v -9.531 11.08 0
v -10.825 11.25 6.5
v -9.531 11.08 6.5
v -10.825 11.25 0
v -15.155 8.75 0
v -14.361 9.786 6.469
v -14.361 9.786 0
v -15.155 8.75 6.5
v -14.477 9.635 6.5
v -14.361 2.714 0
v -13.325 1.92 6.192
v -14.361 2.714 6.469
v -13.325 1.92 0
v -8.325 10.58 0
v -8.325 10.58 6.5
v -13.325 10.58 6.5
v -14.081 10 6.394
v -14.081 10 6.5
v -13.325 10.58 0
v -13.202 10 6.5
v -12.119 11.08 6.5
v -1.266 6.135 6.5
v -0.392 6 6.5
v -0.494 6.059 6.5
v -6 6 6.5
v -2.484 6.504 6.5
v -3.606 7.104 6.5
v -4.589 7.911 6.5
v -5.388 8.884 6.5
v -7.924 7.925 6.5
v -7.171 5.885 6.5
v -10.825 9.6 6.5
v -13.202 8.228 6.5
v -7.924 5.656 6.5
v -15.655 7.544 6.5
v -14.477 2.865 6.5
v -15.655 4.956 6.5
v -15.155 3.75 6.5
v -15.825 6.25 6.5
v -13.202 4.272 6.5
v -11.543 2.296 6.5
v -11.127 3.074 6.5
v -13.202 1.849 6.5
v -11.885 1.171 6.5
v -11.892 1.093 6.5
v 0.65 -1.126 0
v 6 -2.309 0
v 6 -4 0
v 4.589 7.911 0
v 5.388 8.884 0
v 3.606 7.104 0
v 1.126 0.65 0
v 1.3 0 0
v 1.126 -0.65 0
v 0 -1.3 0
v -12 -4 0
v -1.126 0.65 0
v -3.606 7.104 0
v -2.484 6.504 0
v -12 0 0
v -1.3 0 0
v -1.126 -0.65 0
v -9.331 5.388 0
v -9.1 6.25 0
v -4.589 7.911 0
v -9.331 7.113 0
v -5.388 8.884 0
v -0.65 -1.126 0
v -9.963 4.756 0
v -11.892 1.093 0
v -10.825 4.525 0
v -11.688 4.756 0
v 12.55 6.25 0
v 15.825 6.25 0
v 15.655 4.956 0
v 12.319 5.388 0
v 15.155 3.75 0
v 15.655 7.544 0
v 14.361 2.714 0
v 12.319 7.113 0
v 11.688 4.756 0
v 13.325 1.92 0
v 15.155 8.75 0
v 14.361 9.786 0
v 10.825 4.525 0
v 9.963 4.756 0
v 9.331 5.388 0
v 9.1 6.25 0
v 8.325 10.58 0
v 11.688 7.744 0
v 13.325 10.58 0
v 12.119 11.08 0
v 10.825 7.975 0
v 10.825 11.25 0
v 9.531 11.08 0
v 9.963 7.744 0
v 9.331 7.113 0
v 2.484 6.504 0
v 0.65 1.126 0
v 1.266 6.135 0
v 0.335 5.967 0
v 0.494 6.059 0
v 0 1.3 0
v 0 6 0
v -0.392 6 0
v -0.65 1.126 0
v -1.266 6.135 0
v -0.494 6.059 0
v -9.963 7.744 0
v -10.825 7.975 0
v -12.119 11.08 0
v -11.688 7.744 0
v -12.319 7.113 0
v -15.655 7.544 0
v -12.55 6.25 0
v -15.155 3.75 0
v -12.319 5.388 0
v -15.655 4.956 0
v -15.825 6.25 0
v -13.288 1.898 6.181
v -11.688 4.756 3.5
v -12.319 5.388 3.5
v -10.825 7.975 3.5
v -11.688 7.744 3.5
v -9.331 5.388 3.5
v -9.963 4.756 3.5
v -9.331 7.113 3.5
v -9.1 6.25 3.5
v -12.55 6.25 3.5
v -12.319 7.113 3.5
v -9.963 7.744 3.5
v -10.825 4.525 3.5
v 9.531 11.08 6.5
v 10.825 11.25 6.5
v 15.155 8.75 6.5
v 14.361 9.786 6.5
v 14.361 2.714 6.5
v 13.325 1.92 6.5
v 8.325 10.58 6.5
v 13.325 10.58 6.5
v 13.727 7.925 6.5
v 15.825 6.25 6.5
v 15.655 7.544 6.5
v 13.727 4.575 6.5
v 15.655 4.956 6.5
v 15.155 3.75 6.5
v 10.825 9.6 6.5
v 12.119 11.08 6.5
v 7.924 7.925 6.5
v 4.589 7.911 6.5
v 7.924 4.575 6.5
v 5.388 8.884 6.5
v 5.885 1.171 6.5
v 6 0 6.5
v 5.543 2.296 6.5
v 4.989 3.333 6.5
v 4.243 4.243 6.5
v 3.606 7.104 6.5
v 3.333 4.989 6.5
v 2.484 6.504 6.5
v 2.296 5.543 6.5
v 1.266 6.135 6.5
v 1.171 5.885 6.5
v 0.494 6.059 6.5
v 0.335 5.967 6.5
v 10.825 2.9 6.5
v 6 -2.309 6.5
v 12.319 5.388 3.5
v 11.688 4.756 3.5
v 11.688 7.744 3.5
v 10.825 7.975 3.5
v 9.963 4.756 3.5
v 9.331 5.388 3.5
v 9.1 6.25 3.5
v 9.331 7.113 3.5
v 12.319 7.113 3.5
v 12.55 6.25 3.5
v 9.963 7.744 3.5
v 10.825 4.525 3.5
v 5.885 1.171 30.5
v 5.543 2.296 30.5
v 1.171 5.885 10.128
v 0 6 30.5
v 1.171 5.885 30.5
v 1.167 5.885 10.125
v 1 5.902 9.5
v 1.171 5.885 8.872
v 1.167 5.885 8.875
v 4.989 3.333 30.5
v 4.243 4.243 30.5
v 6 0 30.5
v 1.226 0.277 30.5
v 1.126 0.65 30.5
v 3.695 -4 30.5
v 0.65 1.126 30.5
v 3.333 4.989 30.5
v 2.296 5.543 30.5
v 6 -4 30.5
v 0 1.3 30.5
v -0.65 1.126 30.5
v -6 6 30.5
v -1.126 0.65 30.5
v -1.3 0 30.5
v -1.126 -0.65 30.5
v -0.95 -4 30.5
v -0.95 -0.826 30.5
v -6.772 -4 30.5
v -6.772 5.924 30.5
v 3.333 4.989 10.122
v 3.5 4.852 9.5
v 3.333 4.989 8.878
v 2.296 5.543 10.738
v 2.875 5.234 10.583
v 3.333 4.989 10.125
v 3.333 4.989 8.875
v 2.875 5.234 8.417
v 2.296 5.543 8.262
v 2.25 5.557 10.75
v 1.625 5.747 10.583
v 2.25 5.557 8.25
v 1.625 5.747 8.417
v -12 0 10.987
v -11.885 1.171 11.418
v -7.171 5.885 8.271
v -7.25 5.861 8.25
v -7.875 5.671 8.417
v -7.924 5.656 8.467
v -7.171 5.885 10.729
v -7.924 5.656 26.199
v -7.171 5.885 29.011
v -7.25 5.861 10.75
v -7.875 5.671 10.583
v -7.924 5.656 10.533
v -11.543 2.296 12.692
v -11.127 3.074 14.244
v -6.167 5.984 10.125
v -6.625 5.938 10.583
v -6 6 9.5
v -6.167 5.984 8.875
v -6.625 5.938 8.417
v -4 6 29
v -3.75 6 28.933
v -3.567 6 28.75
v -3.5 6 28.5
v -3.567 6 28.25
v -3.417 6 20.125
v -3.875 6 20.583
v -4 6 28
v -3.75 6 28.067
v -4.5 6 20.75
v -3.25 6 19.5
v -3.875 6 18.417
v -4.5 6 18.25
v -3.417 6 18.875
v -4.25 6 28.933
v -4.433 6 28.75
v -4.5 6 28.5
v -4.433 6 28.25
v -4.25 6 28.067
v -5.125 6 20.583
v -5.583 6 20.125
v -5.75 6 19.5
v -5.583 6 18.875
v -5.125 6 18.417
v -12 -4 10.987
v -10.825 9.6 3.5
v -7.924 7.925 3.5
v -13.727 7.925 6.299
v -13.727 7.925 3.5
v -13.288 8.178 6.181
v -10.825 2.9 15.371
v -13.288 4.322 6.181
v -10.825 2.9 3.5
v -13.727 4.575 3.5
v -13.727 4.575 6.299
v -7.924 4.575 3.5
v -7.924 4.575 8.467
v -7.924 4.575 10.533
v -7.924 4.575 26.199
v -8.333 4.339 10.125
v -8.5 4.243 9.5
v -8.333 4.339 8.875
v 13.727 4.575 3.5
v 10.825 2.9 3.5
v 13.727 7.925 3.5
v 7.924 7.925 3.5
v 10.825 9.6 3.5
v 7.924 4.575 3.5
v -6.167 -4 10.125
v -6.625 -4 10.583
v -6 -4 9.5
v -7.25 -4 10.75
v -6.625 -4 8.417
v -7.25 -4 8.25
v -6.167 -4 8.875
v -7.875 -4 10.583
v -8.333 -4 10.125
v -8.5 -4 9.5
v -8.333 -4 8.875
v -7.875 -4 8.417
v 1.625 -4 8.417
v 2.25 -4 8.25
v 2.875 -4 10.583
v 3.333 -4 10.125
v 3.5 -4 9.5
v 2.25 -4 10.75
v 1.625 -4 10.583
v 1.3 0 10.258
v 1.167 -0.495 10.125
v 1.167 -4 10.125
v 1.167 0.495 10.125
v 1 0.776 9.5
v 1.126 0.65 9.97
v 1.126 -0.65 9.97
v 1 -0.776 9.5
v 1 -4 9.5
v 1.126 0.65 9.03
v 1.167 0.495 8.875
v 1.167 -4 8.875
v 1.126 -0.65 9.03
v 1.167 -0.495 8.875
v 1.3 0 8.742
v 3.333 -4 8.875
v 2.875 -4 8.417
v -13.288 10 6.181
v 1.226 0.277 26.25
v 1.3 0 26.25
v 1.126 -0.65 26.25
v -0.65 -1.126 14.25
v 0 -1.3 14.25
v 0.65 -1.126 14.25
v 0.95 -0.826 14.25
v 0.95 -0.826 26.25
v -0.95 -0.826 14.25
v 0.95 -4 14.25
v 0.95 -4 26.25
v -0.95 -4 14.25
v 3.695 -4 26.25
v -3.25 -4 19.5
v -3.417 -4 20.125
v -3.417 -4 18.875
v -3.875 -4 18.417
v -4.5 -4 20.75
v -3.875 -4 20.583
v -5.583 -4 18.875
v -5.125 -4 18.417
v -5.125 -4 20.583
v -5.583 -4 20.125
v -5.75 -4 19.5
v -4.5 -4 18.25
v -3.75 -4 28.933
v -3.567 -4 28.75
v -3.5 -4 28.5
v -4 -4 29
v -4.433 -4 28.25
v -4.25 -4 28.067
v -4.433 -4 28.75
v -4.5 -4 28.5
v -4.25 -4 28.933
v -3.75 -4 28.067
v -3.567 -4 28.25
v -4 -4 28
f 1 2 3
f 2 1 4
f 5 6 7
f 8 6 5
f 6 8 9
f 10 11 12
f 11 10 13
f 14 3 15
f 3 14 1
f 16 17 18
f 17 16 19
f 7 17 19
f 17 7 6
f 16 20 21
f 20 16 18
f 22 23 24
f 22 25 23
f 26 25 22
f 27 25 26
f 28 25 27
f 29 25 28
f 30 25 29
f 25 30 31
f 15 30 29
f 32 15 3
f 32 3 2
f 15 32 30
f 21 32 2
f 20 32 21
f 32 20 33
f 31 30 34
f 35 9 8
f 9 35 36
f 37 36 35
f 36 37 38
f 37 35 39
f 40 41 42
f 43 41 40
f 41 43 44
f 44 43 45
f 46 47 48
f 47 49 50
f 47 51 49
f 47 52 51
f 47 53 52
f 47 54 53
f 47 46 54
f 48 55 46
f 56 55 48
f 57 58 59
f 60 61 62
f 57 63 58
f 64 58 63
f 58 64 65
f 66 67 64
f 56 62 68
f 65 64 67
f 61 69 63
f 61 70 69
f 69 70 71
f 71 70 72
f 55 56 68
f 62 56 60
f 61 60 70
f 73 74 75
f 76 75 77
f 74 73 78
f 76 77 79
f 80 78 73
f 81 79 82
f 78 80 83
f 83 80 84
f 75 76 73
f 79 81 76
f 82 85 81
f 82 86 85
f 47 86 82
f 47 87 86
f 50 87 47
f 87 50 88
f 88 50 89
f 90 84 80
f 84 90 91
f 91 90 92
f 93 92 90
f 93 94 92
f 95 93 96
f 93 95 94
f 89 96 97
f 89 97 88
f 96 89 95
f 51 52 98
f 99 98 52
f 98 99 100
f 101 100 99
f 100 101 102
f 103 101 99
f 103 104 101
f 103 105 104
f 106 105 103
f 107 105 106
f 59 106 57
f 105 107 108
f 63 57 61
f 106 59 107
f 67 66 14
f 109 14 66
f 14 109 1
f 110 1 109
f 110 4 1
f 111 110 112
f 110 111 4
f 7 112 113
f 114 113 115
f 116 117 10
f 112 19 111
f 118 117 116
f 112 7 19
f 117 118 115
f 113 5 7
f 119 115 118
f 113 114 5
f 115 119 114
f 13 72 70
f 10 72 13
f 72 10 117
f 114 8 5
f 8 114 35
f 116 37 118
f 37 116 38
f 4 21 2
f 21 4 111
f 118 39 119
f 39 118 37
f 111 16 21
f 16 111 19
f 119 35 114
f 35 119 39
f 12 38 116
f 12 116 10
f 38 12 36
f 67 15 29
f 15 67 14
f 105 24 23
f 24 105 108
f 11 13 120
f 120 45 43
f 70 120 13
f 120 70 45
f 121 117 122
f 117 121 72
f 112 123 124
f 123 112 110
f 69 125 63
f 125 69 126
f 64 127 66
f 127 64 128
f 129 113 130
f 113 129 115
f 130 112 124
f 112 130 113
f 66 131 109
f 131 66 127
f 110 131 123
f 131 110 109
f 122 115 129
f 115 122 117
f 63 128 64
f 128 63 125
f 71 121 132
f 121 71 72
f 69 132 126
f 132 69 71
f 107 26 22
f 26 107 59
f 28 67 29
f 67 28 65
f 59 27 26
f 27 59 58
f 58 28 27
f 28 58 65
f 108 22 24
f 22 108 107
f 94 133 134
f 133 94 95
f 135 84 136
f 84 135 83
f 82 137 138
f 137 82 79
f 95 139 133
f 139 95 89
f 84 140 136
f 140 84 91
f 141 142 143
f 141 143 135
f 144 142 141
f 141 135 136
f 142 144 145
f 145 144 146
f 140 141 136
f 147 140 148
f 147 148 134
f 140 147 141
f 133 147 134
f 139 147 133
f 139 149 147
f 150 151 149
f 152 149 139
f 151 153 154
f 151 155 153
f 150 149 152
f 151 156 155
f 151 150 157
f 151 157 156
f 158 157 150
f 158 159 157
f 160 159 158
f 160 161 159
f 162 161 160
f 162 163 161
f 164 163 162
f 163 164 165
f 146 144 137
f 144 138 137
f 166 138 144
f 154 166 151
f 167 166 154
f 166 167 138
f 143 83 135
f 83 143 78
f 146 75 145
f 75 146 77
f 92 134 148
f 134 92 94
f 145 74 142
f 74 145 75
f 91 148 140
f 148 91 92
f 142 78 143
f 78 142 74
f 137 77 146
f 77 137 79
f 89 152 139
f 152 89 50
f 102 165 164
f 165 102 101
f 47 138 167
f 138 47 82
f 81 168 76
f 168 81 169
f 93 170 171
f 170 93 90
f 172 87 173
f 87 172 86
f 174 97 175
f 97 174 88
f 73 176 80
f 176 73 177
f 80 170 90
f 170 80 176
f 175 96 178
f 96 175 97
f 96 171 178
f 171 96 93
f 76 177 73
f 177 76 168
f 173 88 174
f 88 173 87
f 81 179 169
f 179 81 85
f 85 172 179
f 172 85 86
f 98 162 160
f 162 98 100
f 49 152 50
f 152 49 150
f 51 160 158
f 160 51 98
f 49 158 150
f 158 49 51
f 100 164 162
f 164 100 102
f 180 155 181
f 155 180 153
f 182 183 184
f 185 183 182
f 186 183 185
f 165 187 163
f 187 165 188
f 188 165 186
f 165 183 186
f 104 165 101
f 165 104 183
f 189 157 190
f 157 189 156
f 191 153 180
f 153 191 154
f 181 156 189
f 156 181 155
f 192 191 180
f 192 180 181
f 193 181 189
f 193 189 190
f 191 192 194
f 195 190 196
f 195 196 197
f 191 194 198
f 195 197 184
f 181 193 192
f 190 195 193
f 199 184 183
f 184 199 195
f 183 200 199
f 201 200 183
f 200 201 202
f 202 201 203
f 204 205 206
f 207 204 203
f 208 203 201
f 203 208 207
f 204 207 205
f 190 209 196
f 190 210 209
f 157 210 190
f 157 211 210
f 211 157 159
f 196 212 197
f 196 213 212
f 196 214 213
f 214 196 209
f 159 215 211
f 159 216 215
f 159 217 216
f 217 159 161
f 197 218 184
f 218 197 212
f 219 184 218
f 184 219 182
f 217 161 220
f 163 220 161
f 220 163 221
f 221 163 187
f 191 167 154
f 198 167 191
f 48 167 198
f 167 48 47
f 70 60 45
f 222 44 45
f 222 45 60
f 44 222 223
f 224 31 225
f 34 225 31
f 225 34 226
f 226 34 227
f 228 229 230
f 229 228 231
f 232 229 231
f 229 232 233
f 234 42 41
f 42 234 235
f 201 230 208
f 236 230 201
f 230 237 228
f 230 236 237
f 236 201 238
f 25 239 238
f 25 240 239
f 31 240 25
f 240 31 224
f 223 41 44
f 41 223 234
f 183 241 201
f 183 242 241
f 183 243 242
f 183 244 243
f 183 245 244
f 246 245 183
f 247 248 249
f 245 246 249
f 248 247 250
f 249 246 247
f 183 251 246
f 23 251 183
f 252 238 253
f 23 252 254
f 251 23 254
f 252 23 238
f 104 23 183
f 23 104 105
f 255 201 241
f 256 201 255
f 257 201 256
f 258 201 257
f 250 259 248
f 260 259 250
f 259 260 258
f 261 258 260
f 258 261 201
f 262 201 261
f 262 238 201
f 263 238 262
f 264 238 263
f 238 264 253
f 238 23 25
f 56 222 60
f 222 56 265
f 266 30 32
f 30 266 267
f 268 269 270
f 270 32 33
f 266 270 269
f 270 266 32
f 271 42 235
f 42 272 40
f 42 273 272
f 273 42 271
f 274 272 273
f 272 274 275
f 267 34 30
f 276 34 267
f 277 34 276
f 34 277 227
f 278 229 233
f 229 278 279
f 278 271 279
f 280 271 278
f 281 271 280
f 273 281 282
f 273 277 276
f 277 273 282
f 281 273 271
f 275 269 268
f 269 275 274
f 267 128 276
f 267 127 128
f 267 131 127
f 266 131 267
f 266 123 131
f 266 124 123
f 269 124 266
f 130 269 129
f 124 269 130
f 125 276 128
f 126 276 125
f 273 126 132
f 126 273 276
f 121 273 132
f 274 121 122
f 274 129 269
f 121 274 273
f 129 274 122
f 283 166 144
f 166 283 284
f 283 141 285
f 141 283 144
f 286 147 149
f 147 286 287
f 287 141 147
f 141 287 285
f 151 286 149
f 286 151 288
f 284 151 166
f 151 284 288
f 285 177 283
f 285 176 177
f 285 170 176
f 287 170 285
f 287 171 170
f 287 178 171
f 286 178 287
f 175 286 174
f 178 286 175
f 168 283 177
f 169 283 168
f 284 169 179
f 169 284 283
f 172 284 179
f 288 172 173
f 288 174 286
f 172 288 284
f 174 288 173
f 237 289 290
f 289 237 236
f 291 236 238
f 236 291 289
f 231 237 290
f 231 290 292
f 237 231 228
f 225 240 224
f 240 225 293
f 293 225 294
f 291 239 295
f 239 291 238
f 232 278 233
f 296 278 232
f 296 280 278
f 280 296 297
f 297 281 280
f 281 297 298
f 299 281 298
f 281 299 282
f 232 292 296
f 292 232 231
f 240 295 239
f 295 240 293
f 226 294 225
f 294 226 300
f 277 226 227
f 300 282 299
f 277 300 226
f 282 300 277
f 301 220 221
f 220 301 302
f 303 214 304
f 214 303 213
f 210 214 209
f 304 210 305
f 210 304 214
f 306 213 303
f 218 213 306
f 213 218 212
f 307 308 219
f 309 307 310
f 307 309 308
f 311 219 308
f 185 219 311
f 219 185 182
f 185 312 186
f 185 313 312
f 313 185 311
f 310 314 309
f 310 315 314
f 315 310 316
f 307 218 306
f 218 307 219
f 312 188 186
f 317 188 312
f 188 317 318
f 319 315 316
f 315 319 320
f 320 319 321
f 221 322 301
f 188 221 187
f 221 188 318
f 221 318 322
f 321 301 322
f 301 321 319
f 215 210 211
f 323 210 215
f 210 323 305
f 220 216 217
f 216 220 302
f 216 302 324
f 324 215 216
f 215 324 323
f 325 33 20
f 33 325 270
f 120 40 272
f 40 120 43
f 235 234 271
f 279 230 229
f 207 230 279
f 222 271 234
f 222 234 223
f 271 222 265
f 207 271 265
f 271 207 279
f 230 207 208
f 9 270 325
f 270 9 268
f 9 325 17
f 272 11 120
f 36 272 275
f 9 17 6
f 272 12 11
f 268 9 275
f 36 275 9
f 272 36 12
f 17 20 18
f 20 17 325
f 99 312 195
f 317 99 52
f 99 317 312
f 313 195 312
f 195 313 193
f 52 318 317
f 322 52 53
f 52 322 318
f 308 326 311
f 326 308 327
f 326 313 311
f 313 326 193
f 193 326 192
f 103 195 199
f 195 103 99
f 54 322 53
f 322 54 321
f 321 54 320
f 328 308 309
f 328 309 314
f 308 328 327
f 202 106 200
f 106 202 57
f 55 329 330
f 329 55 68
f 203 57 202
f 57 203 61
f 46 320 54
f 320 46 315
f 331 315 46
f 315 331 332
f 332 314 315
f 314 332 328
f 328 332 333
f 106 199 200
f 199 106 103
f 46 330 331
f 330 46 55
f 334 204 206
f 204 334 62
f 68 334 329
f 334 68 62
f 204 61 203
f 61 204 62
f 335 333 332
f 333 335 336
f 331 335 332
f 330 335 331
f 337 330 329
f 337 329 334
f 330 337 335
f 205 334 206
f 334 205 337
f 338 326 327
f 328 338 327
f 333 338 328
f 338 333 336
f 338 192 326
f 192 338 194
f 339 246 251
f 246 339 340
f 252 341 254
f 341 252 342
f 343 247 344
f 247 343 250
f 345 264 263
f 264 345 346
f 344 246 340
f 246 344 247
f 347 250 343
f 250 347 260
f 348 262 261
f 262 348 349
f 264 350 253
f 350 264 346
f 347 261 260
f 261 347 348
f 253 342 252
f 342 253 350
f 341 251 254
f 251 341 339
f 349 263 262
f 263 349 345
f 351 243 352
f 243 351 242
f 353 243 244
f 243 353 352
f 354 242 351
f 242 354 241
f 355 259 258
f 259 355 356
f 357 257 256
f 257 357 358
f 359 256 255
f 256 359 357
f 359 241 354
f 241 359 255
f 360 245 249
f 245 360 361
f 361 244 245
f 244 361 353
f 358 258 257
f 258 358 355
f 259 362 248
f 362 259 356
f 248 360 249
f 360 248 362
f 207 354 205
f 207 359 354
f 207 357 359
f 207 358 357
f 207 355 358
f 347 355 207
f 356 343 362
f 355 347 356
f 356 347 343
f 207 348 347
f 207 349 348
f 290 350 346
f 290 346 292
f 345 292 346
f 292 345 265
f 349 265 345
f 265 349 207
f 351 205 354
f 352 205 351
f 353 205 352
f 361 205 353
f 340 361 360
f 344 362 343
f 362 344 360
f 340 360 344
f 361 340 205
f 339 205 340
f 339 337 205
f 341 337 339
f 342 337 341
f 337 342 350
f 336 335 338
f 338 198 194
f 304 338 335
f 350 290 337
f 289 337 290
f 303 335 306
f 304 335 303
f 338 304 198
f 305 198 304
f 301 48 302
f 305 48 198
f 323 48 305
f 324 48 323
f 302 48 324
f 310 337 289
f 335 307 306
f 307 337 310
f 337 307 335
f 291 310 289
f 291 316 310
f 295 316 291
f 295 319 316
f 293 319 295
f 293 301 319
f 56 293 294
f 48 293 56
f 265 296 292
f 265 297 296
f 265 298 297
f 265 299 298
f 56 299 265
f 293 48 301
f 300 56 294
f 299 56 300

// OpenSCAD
// file: microswitch.scad
// Don't print this file, purchase real micro switches
// e.g. Honeywell ZM10B10A01 or OMRON SS-5 or similar.

module microswitch() {
  difference() {
    union() {
      translate([0, 0, 2.5])
        cube([19.8, 6, 10], center=true);
      translate([3, 0.5, 6])
        cube([2, 3.5, 5], center=true);
      for (x = [-8, -1, 8]) {
        translate([x, 0, 0])
          cube([0.6, 3.2, 13], center=true);
      }
    }
    for (x = [-9.5/2, 9.5/2]) {
      translate([x, 0, 0]) rotate([90, 0, 0])
        cylinder(r=2.5/2, h=20, center=true, $fn=12);
    }
  }
}

microswitch();
// file: configuration.scad
// Increase this if your slicer or printer make holes too tight.
extra_radius = 0.1;

// OD = outside diameter, corner to corner.
m3_nut_od = 6.1;
m3_nut_radius = m3_nut_od/2 + 0.2 + extra_radius;
m3_washer_radius = 3.5 + extra_radius;

// Major diameter of metric 3mm thread.
m3_major = 2.85;
m3_radius = m3_major/2 + extra_radius;
m3_wide_radius = m3_major/2 + extra_radius + 0.2;

// NEMA17 stepper motors.
motor_shaft_diameter = 5;
motor_shaft_radius = motor_shaft_diameter/2 + extra_radius;

// Frame brackets. M3x8mm screws work best with 3.6 mm brackets.
thickness = 3.6;

// OpenBeam or Misumi. Currently only 15x15 mm, but there is a plan
// to make models more parametric and allow 20x20 mm in the future.
extrusion = 15;

// Placement for the NEMA17 stepper motors.
motor_offset = 44;
motor_length = 47;

probe_tunnel_radius = 1.25 + extra_radius;
probe_excentricity = 5;
// main file
include <configuration.scad>;

use <microswitch.scad>;

height = 30.5;

height2 = 30.5;

// distance between bottom of switch and z=0
height3 = 7;

// change if you are not using a 1.5mm allen
tunnel = 2.4;

face_offset = 4;

foot_height = 6.5;

module foot() {
  difference() {
    translate([12.5, 0, 0]) rotate([0, 0, -60])
      translate([-12.5, 0, foot_height/2.]) rotate([0, 0, -60]) union() {
        cylinder(r=5, h=foot_height, center=true, $fn=24);
        translate([10, 0, 0])
            cube([20, 10, foot_height], center=true);
    }
    translate([0, -10, 0])
      cube([40, 20, 20], center=true);
    translate([12.5, 0, 0]) {
      // Space for bowden push fit connector.
      cylinder(r=6.49, h=3*height, center=true, $fn=32);
      for (a = [60:120:359]) {
        rotate([0, 0, a]) translate([-12.5, 0, 0])
          cylinder(r=m3_wide_radius, h=20, center=true, $fn=12);
      }
    }
  }
}

module retractable() {
  difference() {
    union() {
      translate([0, 0, height/2])
        cylinder(r=6, h=height, center=true, $fn=32);
      translate([0, -3, height/2])
        cube([12, 6, height], center=true);
      // Lower part on the left.
      translate([-6, 0, height2/2])
        cylinder(r=6, h=height2, center=true, $fn=32);
      translate([-3, 0, height2/2])
        cube([6, 12, height2], center=true);
      translate([-3, -3, height2/2])
        cube([18, 6, height2], center=true);
      // Feet for vertical M3 screw attachment.
      rotate([0, 0, 90]) {
        foot();
        scale([1, -1, 1]) foot();
      }
    }
    translate([-19, 0, height-7]) rotate([0, 15, 0])
      cube([20, 20, height], center=true);
    cylinder(r=tunnel/2+extra_radius, h=3*height, center=true, $fn=12);
    translate([0, -6, height-1])
      cube([tunnel-0.5, 12, height], center=true);
    // cut for upper position of allen
    rotate([0, 0, 30]) translate([0, -6, height+11])
      cube([tunnel, 12, height], center=true);
    // Safety needle spring.
    translate([-4.5, 0, height-11]) rotate([90, 0, 0])
      cylinder(r=2.5/2, h=40, center=true, $fn=12);
    translate([-4, 0, height-2]) rotate([90, 0, 0])
      cylinder(r=1/2, h=40, center=true, $fn=12);
    // Effector screw heads.
    for (x = [-1, 1])
      rotate([0, 0, -x*330]) translate([x*12.5, 0, foot_height-3])
        cylinder(r=m3_nut_radius, h=30, $fn=6);
    // Flat front face.
    translate([0, -face_offset-10, height/2]) difference() {
      cube([30, 20, 2*height], center=true);
    }
    // Sub-miniature micro switch.
    translate([-2.5, -face_offset-3, height3 + 2.5]) {
      % microswitch();
      for (x = [-9.5/2, 9.5/2]) {
        translate([x, 0, 0]) rotate([90, 0, 0])
          cylinder(r=2.5/2, h=40, center=true, $fn=12);
      }
    }
  }
}

retractable();
